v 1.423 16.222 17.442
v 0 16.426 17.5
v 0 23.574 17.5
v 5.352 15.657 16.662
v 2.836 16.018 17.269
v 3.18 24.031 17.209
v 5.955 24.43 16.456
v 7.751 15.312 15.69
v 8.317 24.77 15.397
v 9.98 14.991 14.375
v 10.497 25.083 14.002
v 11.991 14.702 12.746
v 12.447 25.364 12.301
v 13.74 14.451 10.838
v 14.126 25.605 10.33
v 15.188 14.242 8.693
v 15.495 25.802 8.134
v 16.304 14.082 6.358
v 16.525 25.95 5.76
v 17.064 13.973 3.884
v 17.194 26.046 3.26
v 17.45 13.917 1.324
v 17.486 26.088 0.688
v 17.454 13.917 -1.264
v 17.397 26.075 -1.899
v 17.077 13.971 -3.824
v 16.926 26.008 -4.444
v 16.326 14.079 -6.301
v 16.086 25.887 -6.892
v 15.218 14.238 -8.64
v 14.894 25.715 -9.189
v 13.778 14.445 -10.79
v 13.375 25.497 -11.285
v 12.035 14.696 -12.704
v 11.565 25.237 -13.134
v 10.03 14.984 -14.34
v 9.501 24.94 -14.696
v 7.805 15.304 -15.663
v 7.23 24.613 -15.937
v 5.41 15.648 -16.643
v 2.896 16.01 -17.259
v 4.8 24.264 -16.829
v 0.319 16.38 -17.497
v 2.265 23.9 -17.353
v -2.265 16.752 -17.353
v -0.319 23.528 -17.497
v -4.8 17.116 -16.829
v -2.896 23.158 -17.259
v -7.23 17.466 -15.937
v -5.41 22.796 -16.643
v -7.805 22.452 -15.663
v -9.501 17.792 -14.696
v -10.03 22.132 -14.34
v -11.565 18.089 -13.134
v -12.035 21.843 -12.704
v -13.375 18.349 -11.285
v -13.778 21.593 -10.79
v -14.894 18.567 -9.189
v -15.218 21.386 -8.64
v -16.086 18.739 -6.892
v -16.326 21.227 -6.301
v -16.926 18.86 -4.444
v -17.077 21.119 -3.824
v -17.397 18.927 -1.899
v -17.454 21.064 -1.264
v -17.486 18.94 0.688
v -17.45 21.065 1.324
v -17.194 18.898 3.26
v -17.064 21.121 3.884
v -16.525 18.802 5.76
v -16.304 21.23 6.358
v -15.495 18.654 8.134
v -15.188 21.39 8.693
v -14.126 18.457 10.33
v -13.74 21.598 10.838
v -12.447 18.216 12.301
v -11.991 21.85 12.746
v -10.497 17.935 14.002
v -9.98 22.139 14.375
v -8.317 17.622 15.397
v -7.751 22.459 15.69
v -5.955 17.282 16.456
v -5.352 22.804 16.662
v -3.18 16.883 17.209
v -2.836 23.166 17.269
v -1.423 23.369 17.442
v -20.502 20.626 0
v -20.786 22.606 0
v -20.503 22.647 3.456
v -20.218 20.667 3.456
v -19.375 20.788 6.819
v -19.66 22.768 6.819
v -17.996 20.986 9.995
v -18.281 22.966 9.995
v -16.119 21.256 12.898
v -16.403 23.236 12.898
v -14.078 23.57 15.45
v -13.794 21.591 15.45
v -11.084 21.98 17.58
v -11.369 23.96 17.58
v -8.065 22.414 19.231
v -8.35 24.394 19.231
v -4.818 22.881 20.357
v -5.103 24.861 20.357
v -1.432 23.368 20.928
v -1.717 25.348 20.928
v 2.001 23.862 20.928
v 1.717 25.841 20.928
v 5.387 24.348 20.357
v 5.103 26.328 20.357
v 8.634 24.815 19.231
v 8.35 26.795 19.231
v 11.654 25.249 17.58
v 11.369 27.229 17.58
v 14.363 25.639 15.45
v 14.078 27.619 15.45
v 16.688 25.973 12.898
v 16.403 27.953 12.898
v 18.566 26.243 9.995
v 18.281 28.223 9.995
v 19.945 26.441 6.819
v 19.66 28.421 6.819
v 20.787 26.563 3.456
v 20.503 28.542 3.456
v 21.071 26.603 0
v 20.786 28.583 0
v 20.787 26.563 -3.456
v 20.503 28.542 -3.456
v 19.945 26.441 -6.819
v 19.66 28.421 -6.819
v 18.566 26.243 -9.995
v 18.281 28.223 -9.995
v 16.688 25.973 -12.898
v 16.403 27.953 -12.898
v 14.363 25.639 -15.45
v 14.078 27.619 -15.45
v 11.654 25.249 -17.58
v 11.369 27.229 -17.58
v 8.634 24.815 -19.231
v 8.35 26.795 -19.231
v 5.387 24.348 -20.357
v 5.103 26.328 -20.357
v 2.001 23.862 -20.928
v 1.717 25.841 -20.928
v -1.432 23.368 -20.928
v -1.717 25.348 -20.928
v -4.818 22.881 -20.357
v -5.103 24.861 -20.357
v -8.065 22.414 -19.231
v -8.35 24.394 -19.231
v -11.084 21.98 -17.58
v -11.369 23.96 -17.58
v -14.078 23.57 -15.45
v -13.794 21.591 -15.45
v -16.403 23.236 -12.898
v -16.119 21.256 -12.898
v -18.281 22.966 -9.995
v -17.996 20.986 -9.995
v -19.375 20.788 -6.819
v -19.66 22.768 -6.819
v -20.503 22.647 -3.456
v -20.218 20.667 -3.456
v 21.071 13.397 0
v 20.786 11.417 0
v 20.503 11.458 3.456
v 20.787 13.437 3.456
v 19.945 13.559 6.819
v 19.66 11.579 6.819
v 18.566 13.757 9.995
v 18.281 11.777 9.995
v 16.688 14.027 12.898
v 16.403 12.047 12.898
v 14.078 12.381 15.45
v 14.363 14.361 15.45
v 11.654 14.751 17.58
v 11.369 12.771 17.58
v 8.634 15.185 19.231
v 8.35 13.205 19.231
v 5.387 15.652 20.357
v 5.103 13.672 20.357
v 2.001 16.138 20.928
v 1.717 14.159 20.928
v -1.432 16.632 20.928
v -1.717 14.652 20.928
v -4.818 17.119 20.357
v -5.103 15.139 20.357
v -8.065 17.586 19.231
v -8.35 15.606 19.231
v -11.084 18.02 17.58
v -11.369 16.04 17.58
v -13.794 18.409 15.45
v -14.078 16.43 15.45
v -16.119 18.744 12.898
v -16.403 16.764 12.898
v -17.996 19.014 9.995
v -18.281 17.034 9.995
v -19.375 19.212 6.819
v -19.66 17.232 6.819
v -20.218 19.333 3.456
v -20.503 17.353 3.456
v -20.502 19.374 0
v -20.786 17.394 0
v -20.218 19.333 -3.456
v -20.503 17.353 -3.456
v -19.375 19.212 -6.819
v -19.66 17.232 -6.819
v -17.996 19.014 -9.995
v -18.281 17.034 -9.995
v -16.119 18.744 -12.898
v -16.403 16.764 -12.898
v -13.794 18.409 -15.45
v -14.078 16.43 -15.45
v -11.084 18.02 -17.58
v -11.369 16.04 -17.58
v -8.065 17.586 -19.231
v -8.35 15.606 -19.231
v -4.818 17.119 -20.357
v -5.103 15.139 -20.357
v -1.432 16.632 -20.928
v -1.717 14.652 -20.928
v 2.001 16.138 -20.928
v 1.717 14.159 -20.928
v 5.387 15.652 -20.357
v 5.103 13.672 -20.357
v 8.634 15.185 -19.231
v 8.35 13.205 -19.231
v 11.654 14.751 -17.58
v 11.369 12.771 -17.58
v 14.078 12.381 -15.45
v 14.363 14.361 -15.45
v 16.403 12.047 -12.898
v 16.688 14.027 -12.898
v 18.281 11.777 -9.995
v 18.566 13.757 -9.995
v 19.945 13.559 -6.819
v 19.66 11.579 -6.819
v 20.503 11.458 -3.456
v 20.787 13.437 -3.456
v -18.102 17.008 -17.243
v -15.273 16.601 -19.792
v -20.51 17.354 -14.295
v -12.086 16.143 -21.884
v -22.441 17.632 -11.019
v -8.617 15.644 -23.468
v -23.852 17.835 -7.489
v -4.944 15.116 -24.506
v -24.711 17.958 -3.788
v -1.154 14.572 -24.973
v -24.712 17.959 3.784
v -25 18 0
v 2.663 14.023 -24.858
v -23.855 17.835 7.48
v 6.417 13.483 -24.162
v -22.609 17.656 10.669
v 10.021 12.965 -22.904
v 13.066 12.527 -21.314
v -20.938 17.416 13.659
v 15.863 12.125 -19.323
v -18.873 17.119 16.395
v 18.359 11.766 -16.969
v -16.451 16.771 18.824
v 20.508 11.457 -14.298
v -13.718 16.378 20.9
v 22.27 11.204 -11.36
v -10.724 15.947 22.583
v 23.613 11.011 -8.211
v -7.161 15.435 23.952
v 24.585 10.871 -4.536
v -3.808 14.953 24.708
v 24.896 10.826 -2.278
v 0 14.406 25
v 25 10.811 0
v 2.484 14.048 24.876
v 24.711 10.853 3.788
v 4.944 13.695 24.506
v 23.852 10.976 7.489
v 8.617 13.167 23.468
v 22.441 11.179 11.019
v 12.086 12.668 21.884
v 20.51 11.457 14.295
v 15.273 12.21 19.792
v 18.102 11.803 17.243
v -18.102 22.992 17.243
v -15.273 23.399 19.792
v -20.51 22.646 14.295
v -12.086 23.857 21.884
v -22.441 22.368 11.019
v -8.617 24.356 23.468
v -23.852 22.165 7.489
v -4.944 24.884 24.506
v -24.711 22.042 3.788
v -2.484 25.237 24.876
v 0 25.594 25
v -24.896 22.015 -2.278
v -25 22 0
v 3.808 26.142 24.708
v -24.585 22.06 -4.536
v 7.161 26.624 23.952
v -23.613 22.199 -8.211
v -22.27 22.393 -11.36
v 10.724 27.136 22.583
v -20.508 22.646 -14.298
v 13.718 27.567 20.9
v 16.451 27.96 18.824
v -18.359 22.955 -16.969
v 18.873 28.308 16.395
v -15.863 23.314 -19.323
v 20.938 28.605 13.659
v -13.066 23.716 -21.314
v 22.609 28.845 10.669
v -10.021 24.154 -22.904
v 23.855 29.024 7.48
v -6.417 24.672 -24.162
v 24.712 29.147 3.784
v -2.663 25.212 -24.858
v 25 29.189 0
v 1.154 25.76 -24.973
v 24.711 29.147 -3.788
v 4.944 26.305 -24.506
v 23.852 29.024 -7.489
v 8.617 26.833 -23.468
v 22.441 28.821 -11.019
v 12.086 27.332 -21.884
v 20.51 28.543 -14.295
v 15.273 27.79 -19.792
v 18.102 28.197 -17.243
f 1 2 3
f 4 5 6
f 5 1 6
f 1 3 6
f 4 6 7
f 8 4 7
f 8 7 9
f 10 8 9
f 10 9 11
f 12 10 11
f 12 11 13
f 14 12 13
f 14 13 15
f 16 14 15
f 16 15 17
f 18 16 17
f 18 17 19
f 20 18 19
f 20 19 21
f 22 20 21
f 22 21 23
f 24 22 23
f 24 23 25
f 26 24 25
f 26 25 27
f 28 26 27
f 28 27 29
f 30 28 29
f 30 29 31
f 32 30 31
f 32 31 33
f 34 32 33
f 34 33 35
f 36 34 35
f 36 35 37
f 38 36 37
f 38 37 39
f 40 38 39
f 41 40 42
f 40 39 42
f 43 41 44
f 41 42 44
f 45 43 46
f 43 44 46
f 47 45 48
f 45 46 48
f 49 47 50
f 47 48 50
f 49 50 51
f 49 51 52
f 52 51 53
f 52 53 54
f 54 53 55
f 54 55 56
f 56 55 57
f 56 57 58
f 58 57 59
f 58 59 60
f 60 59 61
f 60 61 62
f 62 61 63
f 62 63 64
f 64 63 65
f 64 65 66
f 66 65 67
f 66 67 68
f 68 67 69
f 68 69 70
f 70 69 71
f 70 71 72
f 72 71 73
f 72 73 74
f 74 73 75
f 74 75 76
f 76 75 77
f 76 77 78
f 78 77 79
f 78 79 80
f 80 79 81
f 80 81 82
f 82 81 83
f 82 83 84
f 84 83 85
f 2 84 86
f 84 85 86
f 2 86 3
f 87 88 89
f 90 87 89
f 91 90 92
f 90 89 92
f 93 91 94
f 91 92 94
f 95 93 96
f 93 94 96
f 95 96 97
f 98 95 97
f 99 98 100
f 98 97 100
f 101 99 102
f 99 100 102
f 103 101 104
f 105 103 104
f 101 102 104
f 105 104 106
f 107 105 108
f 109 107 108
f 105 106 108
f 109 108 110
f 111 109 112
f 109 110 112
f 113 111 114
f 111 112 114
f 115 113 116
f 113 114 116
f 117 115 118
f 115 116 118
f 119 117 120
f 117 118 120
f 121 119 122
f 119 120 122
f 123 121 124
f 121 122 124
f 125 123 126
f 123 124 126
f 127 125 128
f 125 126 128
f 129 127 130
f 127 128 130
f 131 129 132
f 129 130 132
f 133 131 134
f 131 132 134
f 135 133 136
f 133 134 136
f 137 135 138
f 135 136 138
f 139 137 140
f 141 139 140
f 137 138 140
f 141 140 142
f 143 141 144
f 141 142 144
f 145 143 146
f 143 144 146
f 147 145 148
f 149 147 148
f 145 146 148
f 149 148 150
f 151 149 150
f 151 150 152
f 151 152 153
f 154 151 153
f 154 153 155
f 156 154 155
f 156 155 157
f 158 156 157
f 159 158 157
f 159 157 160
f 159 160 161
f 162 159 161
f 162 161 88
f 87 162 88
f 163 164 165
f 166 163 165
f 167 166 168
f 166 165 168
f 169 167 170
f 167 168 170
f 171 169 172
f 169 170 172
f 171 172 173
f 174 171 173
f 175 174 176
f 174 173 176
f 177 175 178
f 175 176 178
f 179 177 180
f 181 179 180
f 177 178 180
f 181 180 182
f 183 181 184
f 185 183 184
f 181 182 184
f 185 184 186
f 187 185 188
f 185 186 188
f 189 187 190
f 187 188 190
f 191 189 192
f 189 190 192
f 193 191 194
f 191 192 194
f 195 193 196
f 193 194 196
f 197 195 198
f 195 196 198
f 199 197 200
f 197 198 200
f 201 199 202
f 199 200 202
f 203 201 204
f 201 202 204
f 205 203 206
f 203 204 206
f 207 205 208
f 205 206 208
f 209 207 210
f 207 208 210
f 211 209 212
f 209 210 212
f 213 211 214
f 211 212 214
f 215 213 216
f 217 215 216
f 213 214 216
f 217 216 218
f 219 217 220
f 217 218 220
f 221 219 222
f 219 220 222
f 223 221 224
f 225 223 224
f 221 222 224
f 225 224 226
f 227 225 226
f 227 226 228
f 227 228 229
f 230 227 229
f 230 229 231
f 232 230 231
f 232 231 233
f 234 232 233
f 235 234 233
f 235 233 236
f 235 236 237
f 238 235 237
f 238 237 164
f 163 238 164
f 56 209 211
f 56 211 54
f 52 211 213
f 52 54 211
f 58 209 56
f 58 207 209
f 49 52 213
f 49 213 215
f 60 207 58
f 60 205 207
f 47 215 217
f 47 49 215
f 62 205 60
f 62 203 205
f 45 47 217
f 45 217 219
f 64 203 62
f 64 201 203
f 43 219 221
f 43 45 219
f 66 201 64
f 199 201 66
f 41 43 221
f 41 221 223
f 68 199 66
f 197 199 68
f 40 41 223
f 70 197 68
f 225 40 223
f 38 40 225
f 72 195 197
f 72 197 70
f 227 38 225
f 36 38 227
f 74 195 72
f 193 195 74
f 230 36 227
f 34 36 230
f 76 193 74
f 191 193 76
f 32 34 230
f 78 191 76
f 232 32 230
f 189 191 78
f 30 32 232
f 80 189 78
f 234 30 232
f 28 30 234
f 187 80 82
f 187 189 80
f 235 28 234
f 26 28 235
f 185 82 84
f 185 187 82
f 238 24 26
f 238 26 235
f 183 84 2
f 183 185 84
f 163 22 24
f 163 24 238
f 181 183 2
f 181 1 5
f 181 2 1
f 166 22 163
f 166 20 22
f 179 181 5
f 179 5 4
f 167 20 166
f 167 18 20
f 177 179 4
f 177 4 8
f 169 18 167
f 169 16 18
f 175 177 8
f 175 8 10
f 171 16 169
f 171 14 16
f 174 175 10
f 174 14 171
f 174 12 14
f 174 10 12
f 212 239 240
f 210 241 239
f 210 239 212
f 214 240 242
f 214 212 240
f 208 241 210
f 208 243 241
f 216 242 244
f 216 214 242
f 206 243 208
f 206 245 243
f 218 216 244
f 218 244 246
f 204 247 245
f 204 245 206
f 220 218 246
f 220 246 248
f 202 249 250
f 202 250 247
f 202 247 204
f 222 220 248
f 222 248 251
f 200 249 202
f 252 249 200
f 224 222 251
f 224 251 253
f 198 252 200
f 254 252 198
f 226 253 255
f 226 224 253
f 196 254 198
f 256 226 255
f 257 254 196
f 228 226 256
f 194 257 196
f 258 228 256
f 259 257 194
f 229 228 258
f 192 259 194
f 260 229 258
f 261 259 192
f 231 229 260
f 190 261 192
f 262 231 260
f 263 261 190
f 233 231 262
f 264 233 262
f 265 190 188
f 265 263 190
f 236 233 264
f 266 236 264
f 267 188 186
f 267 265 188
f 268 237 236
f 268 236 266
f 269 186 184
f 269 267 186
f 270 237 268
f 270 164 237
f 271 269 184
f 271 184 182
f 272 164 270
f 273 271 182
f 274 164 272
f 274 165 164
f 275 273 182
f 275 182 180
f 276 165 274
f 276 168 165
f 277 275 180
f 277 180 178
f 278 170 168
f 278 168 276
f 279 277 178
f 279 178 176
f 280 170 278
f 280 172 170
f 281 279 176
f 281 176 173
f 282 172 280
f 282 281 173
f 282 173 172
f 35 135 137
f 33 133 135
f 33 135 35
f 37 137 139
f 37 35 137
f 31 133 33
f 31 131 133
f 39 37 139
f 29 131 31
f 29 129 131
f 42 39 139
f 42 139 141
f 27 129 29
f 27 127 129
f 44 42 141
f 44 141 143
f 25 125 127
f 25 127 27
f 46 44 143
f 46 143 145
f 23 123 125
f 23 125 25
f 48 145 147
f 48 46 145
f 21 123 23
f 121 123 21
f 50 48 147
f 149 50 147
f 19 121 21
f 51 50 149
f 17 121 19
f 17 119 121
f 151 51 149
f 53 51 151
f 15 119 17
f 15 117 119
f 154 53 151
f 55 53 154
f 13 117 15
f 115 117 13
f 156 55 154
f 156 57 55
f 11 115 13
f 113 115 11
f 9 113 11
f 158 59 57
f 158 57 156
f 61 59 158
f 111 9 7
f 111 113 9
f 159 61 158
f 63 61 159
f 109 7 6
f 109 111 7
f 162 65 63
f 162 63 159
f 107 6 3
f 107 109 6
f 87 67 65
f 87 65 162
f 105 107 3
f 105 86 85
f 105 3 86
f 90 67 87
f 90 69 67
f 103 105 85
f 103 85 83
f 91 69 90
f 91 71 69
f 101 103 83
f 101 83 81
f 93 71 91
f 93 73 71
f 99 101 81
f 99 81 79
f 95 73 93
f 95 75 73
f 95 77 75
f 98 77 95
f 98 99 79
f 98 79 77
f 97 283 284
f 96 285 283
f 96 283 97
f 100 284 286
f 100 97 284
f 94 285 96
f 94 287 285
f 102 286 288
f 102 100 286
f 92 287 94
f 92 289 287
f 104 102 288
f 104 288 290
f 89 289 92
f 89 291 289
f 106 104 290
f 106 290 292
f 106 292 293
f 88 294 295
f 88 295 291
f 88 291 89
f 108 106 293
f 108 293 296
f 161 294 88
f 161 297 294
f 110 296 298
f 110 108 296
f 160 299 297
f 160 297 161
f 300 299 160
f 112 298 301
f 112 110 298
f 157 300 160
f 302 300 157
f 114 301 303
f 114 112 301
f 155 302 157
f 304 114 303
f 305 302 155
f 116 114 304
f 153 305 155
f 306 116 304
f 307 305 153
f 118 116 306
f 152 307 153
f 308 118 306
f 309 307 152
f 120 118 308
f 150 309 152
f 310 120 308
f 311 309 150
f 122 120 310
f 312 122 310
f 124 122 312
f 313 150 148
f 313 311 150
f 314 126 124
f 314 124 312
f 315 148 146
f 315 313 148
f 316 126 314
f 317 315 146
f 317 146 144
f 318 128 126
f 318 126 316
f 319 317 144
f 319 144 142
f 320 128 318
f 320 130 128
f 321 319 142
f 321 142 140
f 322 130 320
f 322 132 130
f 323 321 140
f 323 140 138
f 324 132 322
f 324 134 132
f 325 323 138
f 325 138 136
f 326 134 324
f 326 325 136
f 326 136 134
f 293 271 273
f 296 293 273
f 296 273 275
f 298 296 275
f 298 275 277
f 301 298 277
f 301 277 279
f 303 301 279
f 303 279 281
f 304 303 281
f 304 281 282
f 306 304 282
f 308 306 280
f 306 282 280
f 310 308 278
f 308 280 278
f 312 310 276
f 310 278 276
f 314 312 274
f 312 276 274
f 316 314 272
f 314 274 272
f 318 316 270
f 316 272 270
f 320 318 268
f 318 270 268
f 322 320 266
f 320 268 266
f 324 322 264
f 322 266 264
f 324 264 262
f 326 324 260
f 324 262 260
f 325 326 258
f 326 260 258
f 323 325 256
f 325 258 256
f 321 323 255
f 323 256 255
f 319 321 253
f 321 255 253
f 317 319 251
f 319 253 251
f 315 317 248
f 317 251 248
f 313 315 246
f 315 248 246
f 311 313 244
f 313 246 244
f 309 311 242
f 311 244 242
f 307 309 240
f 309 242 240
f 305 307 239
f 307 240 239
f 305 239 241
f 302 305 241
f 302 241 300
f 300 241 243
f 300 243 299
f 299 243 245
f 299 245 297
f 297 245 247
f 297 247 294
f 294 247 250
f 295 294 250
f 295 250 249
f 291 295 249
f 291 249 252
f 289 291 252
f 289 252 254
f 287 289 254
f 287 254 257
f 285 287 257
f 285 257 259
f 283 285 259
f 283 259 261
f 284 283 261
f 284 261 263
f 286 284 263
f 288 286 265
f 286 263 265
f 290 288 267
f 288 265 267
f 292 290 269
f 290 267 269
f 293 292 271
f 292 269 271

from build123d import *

# Parameters (mm, degrees)
SKETCH_1_R          = 25
EXTRUDE_1_DEPTH     = 40
SKETCH_2_R          = 17.5
CUT_EXTRUDE_1_DEPTH = 72
CUT_EXTRUDE_2_DEPTH = 38.5
SKETCH_6_R          = 21
CUT_EXTRUDE_6_DEPTH = 2
SKETCH_7_R          = 21
CUT_EXTRUDE_7_DEPTH = 2


with BuildPart() as part:
    # 草图1 → 凸台-拉伸1 (new body)
    with BuildSketch(Plane(origin=(0, 0, 0), x_dir=(1, 0, 0), z_dir=(0, 1, 0))):
        with Locations(Location((0, 0, 0), (0, 0, 270))):
            Circle(SKETCH_1_R)
    extrude(amount=EXTRUDE_1_DEPTH)

    # 草图2 → 切除-拉伸1 (cut)
    with BuildSketch(Plane(origin=(0, 40, 0), x_dir=(1, 0, 0), z_dir=(0, 1, 0))):
        with Locations(Location((0, 0, 0), (0, 0, 270))):
            Circle(SKETCH_2_R)
    extrude(amount=-CUT_EXTRUDE_1_DEPTH, mode=Mode.SUBTRACT)

    # 草图3 → 切除-拉伸2 (cut, symmetric)
    with BuildSketch(Plane.XY):
        Polygon((-25, 22), (25, 29.188898505), (25, 44.224311684), (-25, 43.752919673), align=None)
        Polygon((25, -4.224311684), (-25, -3.752919673), (-25, 18), (25, 10.811101495), align=None)
    extrude(amount=CUT_EXTRUDE_2_DEPTH, both=True, mode=Mode.SUBTRACT)

    # 草图6 → 切除-拉伸6 (cut)
    with BuildSketch(Plane(origin=(-3.605387021, 25.076074025, 0), x_dir=(0.9898214870420192, 0.14231452417067597, 0), z_dir=(-0.14231452417067594, 0.9898214870420191, 0))):
        with Locations(Location((3.642461867, 0, 0), (0, 0, 180))):
            Circle(SKETCH_6_R)
    extrude(amount=-CUT_EXTRUDE_6_DEPTH, mode=Mode.SUBTRACT)

    # 草图7 → 切除-拉伸7 (cut)
    with BuildSketch(Plane(origin=(2.029251936, 14.113789023, 0), x_dir=(0.9898214870420192, -0.14231452417067597, 0), z_dir=(-0.14231452417067594, -0.9898214870420191, 0))):
        with Locations((-2.0501191, 0)):
            Circle(SKETCH_7_R)
    extrude(amount=-CUT_EXTRUDE_7_DEPTH, mode=Mode.SUBTRACT)


solid = part.part
